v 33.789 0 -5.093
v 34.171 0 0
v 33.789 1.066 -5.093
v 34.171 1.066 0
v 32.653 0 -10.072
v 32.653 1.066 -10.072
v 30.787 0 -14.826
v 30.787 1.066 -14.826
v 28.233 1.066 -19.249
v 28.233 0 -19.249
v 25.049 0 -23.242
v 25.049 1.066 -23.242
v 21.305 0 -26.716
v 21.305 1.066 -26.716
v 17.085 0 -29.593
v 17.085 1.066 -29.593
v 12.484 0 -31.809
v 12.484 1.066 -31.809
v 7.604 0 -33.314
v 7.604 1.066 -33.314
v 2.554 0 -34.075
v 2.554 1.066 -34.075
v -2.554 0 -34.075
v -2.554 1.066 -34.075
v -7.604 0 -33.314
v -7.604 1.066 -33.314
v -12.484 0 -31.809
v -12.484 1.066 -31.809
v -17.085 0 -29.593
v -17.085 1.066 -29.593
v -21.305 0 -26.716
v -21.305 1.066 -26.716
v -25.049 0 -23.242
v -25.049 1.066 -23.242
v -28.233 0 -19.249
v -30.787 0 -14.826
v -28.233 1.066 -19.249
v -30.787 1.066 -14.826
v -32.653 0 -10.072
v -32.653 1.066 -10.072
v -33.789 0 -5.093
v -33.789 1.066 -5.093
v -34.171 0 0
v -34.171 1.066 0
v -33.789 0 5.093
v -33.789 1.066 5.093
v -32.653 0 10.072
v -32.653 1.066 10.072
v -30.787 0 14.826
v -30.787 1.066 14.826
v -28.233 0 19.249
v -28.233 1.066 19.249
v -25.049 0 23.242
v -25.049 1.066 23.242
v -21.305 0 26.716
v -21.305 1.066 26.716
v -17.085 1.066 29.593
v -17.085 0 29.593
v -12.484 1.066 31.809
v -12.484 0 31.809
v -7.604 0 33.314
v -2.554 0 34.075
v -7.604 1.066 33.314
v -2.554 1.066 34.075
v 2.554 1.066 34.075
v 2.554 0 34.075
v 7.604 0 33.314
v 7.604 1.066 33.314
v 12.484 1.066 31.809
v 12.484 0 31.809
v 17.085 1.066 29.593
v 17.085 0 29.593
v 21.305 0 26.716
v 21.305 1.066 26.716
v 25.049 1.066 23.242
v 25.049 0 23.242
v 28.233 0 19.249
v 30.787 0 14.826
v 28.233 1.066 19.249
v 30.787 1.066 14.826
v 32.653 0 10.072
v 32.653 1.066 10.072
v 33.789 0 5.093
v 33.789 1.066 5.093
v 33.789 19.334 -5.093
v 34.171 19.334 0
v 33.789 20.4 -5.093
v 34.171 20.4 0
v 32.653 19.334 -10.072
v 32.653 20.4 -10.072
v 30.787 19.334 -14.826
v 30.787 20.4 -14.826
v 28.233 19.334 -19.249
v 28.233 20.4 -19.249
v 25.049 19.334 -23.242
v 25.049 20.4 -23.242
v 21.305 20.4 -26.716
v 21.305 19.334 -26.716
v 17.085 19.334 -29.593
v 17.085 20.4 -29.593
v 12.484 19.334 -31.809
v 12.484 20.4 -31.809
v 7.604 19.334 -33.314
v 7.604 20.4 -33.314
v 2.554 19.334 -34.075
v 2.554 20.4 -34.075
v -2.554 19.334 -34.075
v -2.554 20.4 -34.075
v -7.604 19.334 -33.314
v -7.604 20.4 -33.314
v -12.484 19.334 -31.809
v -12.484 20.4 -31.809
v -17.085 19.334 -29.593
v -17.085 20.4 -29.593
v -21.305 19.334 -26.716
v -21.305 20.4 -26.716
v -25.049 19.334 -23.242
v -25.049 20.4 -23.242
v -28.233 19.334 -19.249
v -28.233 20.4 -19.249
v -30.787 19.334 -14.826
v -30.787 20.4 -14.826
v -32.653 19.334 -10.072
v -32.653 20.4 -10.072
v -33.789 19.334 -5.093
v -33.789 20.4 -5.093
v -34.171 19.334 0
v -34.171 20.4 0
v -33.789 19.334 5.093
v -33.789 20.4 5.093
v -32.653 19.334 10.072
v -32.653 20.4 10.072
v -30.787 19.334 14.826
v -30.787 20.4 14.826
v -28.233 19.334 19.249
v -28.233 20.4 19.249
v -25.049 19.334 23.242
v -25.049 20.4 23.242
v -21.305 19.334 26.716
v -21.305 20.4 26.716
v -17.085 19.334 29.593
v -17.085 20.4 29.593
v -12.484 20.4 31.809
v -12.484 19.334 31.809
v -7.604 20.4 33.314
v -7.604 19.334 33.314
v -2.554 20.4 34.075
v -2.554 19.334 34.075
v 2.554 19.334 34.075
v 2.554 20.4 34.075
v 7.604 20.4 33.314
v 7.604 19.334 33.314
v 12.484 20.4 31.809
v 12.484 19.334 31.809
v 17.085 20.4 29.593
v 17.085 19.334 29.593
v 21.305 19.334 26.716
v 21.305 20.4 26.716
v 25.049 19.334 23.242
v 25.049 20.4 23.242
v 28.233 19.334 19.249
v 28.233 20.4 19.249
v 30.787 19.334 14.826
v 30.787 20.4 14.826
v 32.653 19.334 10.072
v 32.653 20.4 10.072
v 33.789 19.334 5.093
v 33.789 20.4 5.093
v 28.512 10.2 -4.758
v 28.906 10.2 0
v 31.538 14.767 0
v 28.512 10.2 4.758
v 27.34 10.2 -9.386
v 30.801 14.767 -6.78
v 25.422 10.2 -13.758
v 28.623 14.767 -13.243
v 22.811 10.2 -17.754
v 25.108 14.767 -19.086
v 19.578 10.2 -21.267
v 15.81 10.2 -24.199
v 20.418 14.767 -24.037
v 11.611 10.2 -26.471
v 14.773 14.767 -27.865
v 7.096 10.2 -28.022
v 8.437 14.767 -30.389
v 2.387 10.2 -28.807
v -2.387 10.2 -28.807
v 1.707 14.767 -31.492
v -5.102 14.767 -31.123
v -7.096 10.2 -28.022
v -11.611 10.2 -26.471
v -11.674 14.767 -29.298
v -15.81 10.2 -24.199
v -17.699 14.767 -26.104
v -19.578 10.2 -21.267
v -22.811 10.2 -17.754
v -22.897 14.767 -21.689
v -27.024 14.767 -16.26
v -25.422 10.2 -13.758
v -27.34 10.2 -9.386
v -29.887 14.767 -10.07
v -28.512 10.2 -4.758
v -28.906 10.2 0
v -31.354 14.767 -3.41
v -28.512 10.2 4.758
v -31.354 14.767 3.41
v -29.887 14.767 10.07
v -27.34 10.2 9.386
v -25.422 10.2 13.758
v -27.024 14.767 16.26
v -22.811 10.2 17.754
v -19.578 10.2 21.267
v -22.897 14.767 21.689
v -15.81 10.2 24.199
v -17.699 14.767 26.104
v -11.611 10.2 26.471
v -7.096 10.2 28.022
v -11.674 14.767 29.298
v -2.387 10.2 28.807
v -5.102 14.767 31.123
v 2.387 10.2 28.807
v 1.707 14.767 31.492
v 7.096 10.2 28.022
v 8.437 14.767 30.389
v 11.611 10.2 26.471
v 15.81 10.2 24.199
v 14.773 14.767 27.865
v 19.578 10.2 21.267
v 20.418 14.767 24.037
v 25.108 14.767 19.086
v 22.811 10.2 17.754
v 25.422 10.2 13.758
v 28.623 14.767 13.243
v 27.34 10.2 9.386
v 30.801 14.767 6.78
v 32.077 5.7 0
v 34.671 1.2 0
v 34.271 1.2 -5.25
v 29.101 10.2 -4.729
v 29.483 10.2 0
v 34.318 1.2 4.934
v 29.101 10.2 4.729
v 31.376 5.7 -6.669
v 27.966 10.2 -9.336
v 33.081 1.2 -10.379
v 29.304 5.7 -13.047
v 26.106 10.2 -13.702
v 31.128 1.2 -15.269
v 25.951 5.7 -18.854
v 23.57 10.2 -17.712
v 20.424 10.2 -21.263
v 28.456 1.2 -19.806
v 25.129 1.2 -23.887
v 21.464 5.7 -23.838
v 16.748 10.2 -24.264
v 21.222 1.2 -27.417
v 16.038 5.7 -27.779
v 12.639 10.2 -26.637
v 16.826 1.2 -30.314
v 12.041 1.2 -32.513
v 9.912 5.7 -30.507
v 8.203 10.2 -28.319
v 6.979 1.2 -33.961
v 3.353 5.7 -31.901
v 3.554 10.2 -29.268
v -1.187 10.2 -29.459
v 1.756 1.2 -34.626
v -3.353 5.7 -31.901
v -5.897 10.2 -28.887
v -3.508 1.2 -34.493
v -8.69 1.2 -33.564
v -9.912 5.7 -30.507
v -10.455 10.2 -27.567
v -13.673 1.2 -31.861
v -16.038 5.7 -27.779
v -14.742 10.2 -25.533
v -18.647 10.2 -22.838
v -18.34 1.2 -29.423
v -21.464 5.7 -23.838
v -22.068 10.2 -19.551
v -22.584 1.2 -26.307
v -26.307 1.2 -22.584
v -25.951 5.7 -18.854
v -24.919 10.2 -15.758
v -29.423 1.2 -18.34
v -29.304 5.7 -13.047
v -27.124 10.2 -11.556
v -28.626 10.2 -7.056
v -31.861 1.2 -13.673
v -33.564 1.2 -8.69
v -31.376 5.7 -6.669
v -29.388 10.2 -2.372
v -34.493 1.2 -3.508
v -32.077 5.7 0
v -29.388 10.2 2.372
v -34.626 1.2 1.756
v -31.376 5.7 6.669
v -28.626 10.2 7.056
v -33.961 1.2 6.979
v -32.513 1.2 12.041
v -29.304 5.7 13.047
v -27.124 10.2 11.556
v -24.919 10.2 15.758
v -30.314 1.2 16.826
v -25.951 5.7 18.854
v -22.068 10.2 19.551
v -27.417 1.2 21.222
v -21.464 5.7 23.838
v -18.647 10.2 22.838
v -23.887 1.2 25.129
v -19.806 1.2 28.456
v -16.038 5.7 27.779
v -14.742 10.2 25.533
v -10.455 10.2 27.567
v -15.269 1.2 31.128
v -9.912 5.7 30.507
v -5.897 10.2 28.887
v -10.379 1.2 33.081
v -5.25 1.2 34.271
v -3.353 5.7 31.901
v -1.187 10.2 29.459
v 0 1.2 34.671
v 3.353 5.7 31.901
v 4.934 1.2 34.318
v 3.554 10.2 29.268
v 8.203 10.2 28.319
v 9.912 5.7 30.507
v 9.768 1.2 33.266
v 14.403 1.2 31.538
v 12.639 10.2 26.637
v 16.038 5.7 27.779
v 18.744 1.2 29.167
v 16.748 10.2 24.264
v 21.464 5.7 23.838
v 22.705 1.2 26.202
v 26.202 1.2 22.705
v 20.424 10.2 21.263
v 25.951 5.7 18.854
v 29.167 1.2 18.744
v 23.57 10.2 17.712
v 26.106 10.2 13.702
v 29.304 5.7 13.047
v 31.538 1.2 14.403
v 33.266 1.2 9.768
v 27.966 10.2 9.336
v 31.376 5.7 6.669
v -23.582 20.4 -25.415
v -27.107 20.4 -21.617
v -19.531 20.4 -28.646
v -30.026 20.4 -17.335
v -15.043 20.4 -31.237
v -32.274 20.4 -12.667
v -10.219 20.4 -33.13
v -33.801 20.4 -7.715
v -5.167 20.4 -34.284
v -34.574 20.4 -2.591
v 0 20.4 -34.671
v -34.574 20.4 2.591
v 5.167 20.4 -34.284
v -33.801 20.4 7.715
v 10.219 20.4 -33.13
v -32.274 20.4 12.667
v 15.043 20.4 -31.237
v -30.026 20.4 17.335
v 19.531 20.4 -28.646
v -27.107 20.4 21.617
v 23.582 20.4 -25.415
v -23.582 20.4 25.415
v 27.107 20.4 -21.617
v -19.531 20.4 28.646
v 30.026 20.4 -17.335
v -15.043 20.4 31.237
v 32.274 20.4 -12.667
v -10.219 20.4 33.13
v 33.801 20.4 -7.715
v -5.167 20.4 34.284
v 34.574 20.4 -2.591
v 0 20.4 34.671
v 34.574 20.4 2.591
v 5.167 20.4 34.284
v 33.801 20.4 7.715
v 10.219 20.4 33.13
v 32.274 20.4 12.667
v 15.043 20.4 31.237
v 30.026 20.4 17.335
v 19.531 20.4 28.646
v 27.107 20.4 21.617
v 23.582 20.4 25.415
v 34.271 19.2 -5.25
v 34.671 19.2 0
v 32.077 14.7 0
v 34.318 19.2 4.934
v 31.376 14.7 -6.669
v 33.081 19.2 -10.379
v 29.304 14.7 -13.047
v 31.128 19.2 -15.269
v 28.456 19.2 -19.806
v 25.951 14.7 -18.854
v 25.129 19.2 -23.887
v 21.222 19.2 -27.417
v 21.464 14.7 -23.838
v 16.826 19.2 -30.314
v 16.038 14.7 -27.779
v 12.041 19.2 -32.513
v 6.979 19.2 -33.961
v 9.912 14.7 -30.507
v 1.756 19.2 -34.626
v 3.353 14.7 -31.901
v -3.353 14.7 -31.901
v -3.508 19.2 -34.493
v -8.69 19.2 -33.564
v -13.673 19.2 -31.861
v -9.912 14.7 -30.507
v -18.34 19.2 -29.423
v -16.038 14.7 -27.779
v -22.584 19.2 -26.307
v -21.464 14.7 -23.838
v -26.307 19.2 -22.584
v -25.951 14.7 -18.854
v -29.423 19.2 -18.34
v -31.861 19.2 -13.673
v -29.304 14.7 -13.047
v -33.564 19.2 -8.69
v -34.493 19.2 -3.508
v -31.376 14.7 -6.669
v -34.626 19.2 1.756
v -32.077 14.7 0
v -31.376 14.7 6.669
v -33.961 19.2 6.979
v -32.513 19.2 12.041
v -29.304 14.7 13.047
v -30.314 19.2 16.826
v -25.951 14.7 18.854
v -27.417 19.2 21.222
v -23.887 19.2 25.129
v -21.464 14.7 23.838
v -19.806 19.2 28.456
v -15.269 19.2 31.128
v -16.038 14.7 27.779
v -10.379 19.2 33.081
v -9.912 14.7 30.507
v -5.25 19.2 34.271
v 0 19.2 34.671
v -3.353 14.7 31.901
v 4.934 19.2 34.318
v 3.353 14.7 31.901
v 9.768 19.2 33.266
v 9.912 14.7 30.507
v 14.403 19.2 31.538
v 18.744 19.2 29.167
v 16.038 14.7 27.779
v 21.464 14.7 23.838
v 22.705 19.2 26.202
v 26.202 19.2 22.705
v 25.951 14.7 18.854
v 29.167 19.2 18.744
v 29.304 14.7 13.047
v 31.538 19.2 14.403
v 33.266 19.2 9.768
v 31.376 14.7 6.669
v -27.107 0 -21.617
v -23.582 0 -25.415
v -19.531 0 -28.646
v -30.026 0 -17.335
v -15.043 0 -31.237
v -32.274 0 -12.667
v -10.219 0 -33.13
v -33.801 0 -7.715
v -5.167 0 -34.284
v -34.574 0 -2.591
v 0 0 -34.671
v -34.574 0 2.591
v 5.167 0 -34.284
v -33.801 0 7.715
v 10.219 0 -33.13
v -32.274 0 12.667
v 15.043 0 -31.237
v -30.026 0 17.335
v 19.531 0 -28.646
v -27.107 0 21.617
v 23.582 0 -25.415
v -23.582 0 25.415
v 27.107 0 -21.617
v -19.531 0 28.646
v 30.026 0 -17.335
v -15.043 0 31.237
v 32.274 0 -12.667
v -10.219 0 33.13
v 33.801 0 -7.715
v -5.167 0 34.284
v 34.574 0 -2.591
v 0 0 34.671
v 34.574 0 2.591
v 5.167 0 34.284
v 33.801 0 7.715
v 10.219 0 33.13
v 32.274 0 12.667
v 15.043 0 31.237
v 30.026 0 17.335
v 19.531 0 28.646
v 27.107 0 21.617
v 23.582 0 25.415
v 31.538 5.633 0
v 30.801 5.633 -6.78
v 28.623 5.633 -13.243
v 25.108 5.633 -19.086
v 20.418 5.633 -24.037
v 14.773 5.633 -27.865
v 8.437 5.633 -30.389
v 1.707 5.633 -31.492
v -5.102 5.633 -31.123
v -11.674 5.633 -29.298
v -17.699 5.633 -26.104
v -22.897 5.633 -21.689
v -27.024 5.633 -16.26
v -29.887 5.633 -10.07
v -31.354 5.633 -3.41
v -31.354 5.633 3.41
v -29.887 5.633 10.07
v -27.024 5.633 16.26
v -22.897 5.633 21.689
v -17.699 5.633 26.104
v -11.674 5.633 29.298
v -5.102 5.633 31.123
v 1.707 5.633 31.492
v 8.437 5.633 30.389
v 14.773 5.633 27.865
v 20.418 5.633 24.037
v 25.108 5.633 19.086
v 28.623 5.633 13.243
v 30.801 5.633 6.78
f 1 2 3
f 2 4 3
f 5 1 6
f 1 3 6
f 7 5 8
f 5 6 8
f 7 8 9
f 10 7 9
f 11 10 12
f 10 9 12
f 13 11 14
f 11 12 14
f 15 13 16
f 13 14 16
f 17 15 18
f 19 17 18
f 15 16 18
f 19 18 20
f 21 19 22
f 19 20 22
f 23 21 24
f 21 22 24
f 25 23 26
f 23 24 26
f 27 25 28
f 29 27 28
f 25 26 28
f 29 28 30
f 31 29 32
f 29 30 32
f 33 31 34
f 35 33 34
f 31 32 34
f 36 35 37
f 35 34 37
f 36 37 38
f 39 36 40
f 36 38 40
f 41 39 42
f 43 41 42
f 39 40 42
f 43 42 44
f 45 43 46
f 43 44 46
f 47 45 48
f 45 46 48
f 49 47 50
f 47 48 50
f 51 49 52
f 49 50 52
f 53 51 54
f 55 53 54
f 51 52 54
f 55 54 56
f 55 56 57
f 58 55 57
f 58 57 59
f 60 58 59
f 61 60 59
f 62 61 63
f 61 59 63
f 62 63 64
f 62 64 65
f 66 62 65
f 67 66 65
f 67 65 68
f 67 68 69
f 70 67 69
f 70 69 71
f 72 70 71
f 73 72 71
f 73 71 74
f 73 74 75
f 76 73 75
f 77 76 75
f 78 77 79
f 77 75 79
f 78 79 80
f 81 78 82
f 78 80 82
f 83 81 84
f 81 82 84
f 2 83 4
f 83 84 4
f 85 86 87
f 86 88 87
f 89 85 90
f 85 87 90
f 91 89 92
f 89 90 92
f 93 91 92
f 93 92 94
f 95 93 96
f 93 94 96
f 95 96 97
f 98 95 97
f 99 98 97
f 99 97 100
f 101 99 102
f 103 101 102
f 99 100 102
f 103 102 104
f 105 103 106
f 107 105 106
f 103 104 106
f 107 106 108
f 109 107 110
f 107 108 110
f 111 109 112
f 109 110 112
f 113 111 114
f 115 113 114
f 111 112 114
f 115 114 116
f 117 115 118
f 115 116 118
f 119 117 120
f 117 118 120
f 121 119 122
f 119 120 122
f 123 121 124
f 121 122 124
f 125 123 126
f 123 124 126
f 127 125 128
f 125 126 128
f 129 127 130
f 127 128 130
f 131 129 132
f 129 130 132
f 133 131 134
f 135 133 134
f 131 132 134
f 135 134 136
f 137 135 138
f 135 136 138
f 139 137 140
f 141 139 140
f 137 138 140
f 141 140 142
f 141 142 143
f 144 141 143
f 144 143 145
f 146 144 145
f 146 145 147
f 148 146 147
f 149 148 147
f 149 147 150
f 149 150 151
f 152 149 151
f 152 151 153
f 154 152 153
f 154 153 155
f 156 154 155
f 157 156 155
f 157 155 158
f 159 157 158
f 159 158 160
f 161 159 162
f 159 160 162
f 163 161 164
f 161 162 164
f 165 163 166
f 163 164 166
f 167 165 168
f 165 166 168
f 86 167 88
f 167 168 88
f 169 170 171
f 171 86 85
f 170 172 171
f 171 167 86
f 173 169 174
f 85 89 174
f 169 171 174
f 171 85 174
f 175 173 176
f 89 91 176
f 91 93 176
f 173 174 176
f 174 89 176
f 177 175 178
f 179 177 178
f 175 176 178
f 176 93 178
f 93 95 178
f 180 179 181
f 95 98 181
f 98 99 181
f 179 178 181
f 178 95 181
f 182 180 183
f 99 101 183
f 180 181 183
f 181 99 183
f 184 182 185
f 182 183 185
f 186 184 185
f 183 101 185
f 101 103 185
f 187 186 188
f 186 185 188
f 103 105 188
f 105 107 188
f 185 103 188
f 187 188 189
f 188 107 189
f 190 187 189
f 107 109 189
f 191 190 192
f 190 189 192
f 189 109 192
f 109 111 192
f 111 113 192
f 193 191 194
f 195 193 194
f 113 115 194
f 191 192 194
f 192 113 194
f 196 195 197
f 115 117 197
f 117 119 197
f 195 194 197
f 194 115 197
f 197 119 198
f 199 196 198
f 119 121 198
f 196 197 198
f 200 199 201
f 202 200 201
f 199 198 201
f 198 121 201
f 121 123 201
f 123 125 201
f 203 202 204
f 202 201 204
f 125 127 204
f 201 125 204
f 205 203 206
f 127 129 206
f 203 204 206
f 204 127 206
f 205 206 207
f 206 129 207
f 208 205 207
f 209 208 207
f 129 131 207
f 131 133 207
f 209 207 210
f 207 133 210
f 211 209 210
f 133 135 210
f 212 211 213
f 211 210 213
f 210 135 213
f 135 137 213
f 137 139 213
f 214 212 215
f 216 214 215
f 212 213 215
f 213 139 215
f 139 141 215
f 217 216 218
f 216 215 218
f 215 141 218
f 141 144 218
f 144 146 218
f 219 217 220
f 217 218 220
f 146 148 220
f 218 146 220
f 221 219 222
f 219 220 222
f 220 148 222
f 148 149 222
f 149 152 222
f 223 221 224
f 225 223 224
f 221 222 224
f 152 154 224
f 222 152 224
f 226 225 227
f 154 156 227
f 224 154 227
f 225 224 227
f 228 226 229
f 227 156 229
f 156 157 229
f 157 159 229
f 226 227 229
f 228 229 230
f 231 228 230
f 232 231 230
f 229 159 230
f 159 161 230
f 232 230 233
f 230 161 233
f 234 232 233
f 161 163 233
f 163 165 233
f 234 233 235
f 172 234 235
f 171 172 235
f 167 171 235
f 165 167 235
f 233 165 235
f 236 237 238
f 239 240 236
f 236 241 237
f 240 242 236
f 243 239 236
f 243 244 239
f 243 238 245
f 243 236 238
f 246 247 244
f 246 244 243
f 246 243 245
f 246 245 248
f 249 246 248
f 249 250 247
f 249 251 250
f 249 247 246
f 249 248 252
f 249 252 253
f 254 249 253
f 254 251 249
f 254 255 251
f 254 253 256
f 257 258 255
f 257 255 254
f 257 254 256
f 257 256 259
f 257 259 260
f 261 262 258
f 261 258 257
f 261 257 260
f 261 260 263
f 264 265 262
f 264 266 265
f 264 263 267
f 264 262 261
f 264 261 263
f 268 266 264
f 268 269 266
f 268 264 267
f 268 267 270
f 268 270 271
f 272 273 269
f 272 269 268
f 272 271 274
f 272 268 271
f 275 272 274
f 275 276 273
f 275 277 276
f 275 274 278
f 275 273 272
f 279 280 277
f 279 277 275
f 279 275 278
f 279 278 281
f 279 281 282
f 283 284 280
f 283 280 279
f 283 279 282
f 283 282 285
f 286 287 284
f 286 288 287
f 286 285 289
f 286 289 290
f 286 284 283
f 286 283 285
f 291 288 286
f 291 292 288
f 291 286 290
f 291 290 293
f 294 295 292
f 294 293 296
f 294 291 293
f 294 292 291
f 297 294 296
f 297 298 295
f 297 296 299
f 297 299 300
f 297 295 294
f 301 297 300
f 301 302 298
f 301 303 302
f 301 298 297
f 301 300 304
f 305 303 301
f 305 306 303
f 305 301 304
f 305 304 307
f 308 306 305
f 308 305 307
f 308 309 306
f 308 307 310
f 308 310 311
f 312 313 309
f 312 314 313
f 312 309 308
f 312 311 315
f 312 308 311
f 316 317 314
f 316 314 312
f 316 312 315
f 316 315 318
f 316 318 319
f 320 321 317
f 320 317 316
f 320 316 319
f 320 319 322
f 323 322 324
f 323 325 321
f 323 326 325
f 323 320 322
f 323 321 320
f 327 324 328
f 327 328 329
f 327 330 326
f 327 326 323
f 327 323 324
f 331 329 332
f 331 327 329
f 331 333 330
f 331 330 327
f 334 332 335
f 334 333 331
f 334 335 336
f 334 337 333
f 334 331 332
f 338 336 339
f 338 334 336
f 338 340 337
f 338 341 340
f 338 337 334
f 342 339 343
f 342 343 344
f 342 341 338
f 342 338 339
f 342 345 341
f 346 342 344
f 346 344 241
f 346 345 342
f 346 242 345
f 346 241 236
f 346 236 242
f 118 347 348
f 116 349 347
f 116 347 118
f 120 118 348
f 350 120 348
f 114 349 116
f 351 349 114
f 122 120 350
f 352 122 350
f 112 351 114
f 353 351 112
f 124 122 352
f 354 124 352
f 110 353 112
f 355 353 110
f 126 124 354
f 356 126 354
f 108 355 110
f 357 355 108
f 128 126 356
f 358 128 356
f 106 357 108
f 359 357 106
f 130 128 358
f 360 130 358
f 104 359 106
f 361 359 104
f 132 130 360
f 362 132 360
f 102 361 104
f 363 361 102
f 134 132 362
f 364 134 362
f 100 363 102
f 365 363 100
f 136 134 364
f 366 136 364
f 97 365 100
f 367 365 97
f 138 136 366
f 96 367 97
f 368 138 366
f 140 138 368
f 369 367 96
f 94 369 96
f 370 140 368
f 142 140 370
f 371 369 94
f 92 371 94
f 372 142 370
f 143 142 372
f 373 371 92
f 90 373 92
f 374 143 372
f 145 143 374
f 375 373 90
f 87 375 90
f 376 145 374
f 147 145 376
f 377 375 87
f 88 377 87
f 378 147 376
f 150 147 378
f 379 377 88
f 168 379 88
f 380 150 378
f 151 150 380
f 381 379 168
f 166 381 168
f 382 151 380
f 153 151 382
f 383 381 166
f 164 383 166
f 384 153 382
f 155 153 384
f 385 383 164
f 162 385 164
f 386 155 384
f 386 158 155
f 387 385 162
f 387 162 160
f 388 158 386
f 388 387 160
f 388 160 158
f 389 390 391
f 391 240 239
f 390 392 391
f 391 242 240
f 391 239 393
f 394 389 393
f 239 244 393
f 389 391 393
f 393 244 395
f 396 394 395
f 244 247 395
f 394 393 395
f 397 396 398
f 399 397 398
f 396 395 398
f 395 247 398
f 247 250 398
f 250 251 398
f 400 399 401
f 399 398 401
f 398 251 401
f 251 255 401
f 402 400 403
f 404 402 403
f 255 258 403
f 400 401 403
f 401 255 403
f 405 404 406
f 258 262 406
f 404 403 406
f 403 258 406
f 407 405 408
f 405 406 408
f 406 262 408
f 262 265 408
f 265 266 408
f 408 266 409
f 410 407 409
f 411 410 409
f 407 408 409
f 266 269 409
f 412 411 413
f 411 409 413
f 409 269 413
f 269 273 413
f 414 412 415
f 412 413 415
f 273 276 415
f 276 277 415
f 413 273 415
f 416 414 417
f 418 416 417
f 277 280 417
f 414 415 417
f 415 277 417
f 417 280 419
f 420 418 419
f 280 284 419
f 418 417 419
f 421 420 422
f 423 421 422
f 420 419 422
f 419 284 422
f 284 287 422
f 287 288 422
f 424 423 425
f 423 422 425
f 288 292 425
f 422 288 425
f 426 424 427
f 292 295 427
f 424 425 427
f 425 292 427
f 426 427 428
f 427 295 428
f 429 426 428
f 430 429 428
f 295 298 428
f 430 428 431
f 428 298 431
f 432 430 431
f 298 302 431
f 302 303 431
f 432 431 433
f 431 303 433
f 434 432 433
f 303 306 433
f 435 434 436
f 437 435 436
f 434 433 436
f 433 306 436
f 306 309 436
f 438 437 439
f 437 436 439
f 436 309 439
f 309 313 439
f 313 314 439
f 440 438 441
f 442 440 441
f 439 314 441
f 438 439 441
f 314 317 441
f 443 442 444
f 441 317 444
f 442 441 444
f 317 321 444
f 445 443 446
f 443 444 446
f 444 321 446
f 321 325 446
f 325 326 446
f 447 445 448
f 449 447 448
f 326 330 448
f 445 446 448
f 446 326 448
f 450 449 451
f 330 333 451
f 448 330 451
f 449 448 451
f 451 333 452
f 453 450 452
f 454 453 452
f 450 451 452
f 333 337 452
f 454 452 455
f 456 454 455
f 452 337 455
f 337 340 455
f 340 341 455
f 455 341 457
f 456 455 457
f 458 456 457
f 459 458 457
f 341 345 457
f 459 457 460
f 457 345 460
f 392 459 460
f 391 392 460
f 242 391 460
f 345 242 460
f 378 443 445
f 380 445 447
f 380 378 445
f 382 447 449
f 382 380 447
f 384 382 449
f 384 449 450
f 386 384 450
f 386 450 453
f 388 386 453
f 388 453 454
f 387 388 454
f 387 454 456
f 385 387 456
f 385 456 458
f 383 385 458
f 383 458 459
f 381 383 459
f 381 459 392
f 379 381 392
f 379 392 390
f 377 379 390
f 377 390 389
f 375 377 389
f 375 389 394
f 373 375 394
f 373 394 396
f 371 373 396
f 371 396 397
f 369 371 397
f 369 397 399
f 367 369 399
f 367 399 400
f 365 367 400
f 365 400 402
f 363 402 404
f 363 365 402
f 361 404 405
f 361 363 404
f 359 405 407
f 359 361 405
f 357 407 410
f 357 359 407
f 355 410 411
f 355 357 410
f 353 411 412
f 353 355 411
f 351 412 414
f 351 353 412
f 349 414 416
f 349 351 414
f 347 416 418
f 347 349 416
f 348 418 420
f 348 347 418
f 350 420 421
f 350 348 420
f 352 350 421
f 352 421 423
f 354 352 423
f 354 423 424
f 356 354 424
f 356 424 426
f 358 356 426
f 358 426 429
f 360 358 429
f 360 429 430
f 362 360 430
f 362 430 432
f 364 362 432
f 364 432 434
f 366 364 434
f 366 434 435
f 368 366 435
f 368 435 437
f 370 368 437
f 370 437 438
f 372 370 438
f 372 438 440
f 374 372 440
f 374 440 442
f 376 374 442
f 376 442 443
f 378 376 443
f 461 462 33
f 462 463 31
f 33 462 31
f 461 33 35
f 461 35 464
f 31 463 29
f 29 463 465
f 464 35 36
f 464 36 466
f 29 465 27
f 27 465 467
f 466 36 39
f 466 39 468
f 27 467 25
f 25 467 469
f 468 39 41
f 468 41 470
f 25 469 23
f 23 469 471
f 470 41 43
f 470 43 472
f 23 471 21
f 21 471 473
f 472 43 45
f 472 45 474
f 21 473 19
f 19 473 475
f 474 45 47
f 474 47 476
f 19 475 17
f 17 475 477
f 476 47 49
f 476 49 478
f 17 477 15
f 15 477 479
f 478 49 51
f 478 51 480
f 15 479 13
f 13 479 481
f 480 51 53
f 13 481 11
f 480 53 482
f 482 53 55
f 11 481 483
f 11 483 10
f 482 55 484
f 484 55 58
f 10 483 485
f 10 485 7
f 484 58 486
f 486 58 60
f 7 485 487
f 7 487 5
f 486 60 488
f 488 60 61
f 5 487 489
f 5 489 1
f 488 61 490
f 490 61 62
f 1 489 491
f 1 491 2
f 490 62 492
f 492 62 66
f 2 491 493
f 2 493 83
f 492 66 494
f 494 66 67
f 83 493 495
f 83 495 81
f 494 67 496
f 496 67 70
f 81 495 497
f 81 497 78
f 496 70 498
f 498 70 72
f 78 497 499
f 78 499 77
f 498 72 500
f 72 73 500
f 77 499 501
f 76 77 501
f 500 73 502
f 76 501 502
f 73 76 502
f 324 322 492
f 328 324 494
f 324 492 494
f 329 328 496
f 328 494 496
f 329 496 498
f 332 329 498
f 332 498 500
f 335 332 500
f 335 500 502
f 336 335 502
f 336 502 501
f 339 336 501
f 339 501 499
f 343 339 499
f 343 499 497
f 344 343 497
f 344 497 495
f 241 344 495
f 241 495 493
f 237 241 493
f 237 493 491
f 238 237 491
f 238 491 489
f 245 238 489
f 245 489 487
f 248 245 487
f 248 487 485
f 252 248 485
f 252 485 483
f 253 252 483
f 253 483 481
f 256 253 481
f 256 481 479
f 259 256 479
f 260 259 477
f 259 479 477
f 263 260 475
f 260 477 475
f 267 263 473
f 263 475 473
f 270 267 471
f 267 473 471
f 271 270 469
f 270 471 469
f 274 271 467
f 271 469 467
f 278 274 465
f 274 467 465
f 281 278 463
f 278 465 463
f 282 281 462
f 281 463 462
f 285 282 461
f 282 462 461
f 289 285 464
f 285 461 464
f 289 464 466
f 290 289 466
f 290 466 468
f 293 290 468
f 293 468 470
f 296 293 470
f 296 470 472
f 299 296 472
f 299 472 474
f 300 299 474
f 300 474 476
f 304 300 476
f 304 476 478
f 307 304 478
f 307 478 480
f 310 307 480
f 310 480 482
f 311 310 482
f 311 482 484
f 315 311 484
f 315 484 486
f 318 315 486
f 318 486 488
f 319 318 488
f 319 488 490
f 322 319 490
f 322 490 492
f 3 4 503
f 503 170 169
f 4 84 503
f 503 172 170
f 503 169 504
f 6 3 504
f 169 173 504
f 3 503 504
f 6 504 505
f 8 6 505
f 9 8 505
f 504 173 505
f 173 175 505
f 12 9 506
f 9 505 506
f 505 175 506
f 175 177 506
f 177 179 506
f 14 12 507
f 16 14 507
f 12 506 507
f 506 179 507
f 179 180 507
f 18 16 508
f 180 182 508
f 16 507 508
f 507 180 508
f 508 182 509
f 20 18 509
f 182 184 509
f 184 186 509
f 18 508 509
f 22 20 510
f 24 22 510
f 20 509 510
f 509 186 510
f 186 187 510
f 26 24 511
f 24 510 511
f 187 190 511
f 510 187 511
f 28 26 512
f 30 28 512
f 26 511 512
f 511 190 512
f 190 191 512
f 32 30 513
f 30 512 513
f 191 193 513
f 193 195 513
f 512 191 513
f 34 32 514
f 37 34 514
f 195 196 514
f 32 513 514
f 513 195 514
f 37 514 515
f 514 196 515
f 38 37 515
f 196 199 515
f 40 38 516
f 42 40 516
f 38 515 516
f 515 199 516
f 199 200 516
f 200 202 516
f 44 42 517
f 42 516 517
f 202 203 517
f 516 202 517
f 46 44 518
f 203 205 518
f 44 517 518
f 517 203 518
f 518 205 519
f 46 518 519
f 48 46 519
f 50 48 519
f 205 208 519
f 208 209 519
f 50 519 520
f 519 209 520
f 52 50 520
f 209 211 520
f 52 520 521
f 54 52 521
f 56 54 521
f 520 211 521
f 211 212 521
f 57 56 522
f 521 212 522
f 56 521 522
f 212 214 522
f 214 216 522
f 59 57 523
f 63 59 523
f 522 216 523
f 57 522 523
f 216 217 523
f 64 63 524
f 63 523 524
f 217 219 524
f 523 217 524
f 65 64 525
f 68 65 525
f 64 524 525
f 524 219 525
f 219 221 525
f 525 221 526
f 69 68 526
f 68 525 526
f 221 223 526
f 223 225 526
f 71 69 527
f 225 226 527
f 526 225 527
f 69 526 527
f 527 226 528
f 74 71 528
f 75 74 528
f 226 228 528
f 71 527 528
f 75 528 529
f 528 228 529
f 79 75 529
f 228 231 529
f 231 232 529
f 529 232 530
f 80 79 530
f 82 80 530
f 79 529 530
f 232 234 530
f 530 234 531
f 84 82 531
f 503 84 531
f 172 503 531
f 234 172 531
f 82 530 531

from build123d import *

# Parameters (mm, degrees)
SKETCH_1_R      = 34.670752002
EXTRUDE_1_DEPTH = 1.2
SKETCH_3_R      = 34.670752002
SKETCH_2_R      = 29.48320138


# Read off the part's stored shape, not the designer's step: 쉘1
with BuildPart() as part:
    # 스케치1 → 보스-돌출1 (new body)
    with BuildSketch(Plane(origin=(0, 0, 0), x_dir=(1, 0, 0), z_dir=(0, 1, 0))):
        with Locations(Location((0, 0, 0), (0, 0, 270))):
            Circle(SKETCH_1_R)
    extrude_1 = extrude(amount=EXTRUDE_1_DEPTH)

    # 스케치3 → 로프트1 section 0
    with BuildSketch(Plane(origin=(0, 1.2, 0), x_dir=(1, 0, 0), z_dir=(0, 1, 0))):
        Circle(SKETCH_3_R)
    # 스케치2 → 로프트1 section 1
    with BuildSketch(Plane(origin=(0, 10.2, 0), x_dir=(1, 0, 0), z_dir=(0, 1, 0))):
        Circle(SKETCH_2_R)
    loft_1 = loft()

    # 대칭 복사1: 보스-돌출1, 로프트1 across plane
    add(extrude_1.mirror(Plane.ZX.offset(10.2)))
    add(loft_1.mirror(Plane.ZX.offset(10.2)))

    # 쉘1 outline → 쉘1 (revolve, cut)
    with BuildSketch(Plane.XY):
        Polygon((34.170752002, 0), (34.170752002, 1.066217535), (28.906089901, 10.2), (34.170752002, 19.333782465), (34.170752002, 20.4), (0, 20.4), (0, 0), align=None)
    revolve(axis=Axis((0, 0, 0), (0, 1, 0)), mode=Mode.SUBTRACT)


solid = part.part
